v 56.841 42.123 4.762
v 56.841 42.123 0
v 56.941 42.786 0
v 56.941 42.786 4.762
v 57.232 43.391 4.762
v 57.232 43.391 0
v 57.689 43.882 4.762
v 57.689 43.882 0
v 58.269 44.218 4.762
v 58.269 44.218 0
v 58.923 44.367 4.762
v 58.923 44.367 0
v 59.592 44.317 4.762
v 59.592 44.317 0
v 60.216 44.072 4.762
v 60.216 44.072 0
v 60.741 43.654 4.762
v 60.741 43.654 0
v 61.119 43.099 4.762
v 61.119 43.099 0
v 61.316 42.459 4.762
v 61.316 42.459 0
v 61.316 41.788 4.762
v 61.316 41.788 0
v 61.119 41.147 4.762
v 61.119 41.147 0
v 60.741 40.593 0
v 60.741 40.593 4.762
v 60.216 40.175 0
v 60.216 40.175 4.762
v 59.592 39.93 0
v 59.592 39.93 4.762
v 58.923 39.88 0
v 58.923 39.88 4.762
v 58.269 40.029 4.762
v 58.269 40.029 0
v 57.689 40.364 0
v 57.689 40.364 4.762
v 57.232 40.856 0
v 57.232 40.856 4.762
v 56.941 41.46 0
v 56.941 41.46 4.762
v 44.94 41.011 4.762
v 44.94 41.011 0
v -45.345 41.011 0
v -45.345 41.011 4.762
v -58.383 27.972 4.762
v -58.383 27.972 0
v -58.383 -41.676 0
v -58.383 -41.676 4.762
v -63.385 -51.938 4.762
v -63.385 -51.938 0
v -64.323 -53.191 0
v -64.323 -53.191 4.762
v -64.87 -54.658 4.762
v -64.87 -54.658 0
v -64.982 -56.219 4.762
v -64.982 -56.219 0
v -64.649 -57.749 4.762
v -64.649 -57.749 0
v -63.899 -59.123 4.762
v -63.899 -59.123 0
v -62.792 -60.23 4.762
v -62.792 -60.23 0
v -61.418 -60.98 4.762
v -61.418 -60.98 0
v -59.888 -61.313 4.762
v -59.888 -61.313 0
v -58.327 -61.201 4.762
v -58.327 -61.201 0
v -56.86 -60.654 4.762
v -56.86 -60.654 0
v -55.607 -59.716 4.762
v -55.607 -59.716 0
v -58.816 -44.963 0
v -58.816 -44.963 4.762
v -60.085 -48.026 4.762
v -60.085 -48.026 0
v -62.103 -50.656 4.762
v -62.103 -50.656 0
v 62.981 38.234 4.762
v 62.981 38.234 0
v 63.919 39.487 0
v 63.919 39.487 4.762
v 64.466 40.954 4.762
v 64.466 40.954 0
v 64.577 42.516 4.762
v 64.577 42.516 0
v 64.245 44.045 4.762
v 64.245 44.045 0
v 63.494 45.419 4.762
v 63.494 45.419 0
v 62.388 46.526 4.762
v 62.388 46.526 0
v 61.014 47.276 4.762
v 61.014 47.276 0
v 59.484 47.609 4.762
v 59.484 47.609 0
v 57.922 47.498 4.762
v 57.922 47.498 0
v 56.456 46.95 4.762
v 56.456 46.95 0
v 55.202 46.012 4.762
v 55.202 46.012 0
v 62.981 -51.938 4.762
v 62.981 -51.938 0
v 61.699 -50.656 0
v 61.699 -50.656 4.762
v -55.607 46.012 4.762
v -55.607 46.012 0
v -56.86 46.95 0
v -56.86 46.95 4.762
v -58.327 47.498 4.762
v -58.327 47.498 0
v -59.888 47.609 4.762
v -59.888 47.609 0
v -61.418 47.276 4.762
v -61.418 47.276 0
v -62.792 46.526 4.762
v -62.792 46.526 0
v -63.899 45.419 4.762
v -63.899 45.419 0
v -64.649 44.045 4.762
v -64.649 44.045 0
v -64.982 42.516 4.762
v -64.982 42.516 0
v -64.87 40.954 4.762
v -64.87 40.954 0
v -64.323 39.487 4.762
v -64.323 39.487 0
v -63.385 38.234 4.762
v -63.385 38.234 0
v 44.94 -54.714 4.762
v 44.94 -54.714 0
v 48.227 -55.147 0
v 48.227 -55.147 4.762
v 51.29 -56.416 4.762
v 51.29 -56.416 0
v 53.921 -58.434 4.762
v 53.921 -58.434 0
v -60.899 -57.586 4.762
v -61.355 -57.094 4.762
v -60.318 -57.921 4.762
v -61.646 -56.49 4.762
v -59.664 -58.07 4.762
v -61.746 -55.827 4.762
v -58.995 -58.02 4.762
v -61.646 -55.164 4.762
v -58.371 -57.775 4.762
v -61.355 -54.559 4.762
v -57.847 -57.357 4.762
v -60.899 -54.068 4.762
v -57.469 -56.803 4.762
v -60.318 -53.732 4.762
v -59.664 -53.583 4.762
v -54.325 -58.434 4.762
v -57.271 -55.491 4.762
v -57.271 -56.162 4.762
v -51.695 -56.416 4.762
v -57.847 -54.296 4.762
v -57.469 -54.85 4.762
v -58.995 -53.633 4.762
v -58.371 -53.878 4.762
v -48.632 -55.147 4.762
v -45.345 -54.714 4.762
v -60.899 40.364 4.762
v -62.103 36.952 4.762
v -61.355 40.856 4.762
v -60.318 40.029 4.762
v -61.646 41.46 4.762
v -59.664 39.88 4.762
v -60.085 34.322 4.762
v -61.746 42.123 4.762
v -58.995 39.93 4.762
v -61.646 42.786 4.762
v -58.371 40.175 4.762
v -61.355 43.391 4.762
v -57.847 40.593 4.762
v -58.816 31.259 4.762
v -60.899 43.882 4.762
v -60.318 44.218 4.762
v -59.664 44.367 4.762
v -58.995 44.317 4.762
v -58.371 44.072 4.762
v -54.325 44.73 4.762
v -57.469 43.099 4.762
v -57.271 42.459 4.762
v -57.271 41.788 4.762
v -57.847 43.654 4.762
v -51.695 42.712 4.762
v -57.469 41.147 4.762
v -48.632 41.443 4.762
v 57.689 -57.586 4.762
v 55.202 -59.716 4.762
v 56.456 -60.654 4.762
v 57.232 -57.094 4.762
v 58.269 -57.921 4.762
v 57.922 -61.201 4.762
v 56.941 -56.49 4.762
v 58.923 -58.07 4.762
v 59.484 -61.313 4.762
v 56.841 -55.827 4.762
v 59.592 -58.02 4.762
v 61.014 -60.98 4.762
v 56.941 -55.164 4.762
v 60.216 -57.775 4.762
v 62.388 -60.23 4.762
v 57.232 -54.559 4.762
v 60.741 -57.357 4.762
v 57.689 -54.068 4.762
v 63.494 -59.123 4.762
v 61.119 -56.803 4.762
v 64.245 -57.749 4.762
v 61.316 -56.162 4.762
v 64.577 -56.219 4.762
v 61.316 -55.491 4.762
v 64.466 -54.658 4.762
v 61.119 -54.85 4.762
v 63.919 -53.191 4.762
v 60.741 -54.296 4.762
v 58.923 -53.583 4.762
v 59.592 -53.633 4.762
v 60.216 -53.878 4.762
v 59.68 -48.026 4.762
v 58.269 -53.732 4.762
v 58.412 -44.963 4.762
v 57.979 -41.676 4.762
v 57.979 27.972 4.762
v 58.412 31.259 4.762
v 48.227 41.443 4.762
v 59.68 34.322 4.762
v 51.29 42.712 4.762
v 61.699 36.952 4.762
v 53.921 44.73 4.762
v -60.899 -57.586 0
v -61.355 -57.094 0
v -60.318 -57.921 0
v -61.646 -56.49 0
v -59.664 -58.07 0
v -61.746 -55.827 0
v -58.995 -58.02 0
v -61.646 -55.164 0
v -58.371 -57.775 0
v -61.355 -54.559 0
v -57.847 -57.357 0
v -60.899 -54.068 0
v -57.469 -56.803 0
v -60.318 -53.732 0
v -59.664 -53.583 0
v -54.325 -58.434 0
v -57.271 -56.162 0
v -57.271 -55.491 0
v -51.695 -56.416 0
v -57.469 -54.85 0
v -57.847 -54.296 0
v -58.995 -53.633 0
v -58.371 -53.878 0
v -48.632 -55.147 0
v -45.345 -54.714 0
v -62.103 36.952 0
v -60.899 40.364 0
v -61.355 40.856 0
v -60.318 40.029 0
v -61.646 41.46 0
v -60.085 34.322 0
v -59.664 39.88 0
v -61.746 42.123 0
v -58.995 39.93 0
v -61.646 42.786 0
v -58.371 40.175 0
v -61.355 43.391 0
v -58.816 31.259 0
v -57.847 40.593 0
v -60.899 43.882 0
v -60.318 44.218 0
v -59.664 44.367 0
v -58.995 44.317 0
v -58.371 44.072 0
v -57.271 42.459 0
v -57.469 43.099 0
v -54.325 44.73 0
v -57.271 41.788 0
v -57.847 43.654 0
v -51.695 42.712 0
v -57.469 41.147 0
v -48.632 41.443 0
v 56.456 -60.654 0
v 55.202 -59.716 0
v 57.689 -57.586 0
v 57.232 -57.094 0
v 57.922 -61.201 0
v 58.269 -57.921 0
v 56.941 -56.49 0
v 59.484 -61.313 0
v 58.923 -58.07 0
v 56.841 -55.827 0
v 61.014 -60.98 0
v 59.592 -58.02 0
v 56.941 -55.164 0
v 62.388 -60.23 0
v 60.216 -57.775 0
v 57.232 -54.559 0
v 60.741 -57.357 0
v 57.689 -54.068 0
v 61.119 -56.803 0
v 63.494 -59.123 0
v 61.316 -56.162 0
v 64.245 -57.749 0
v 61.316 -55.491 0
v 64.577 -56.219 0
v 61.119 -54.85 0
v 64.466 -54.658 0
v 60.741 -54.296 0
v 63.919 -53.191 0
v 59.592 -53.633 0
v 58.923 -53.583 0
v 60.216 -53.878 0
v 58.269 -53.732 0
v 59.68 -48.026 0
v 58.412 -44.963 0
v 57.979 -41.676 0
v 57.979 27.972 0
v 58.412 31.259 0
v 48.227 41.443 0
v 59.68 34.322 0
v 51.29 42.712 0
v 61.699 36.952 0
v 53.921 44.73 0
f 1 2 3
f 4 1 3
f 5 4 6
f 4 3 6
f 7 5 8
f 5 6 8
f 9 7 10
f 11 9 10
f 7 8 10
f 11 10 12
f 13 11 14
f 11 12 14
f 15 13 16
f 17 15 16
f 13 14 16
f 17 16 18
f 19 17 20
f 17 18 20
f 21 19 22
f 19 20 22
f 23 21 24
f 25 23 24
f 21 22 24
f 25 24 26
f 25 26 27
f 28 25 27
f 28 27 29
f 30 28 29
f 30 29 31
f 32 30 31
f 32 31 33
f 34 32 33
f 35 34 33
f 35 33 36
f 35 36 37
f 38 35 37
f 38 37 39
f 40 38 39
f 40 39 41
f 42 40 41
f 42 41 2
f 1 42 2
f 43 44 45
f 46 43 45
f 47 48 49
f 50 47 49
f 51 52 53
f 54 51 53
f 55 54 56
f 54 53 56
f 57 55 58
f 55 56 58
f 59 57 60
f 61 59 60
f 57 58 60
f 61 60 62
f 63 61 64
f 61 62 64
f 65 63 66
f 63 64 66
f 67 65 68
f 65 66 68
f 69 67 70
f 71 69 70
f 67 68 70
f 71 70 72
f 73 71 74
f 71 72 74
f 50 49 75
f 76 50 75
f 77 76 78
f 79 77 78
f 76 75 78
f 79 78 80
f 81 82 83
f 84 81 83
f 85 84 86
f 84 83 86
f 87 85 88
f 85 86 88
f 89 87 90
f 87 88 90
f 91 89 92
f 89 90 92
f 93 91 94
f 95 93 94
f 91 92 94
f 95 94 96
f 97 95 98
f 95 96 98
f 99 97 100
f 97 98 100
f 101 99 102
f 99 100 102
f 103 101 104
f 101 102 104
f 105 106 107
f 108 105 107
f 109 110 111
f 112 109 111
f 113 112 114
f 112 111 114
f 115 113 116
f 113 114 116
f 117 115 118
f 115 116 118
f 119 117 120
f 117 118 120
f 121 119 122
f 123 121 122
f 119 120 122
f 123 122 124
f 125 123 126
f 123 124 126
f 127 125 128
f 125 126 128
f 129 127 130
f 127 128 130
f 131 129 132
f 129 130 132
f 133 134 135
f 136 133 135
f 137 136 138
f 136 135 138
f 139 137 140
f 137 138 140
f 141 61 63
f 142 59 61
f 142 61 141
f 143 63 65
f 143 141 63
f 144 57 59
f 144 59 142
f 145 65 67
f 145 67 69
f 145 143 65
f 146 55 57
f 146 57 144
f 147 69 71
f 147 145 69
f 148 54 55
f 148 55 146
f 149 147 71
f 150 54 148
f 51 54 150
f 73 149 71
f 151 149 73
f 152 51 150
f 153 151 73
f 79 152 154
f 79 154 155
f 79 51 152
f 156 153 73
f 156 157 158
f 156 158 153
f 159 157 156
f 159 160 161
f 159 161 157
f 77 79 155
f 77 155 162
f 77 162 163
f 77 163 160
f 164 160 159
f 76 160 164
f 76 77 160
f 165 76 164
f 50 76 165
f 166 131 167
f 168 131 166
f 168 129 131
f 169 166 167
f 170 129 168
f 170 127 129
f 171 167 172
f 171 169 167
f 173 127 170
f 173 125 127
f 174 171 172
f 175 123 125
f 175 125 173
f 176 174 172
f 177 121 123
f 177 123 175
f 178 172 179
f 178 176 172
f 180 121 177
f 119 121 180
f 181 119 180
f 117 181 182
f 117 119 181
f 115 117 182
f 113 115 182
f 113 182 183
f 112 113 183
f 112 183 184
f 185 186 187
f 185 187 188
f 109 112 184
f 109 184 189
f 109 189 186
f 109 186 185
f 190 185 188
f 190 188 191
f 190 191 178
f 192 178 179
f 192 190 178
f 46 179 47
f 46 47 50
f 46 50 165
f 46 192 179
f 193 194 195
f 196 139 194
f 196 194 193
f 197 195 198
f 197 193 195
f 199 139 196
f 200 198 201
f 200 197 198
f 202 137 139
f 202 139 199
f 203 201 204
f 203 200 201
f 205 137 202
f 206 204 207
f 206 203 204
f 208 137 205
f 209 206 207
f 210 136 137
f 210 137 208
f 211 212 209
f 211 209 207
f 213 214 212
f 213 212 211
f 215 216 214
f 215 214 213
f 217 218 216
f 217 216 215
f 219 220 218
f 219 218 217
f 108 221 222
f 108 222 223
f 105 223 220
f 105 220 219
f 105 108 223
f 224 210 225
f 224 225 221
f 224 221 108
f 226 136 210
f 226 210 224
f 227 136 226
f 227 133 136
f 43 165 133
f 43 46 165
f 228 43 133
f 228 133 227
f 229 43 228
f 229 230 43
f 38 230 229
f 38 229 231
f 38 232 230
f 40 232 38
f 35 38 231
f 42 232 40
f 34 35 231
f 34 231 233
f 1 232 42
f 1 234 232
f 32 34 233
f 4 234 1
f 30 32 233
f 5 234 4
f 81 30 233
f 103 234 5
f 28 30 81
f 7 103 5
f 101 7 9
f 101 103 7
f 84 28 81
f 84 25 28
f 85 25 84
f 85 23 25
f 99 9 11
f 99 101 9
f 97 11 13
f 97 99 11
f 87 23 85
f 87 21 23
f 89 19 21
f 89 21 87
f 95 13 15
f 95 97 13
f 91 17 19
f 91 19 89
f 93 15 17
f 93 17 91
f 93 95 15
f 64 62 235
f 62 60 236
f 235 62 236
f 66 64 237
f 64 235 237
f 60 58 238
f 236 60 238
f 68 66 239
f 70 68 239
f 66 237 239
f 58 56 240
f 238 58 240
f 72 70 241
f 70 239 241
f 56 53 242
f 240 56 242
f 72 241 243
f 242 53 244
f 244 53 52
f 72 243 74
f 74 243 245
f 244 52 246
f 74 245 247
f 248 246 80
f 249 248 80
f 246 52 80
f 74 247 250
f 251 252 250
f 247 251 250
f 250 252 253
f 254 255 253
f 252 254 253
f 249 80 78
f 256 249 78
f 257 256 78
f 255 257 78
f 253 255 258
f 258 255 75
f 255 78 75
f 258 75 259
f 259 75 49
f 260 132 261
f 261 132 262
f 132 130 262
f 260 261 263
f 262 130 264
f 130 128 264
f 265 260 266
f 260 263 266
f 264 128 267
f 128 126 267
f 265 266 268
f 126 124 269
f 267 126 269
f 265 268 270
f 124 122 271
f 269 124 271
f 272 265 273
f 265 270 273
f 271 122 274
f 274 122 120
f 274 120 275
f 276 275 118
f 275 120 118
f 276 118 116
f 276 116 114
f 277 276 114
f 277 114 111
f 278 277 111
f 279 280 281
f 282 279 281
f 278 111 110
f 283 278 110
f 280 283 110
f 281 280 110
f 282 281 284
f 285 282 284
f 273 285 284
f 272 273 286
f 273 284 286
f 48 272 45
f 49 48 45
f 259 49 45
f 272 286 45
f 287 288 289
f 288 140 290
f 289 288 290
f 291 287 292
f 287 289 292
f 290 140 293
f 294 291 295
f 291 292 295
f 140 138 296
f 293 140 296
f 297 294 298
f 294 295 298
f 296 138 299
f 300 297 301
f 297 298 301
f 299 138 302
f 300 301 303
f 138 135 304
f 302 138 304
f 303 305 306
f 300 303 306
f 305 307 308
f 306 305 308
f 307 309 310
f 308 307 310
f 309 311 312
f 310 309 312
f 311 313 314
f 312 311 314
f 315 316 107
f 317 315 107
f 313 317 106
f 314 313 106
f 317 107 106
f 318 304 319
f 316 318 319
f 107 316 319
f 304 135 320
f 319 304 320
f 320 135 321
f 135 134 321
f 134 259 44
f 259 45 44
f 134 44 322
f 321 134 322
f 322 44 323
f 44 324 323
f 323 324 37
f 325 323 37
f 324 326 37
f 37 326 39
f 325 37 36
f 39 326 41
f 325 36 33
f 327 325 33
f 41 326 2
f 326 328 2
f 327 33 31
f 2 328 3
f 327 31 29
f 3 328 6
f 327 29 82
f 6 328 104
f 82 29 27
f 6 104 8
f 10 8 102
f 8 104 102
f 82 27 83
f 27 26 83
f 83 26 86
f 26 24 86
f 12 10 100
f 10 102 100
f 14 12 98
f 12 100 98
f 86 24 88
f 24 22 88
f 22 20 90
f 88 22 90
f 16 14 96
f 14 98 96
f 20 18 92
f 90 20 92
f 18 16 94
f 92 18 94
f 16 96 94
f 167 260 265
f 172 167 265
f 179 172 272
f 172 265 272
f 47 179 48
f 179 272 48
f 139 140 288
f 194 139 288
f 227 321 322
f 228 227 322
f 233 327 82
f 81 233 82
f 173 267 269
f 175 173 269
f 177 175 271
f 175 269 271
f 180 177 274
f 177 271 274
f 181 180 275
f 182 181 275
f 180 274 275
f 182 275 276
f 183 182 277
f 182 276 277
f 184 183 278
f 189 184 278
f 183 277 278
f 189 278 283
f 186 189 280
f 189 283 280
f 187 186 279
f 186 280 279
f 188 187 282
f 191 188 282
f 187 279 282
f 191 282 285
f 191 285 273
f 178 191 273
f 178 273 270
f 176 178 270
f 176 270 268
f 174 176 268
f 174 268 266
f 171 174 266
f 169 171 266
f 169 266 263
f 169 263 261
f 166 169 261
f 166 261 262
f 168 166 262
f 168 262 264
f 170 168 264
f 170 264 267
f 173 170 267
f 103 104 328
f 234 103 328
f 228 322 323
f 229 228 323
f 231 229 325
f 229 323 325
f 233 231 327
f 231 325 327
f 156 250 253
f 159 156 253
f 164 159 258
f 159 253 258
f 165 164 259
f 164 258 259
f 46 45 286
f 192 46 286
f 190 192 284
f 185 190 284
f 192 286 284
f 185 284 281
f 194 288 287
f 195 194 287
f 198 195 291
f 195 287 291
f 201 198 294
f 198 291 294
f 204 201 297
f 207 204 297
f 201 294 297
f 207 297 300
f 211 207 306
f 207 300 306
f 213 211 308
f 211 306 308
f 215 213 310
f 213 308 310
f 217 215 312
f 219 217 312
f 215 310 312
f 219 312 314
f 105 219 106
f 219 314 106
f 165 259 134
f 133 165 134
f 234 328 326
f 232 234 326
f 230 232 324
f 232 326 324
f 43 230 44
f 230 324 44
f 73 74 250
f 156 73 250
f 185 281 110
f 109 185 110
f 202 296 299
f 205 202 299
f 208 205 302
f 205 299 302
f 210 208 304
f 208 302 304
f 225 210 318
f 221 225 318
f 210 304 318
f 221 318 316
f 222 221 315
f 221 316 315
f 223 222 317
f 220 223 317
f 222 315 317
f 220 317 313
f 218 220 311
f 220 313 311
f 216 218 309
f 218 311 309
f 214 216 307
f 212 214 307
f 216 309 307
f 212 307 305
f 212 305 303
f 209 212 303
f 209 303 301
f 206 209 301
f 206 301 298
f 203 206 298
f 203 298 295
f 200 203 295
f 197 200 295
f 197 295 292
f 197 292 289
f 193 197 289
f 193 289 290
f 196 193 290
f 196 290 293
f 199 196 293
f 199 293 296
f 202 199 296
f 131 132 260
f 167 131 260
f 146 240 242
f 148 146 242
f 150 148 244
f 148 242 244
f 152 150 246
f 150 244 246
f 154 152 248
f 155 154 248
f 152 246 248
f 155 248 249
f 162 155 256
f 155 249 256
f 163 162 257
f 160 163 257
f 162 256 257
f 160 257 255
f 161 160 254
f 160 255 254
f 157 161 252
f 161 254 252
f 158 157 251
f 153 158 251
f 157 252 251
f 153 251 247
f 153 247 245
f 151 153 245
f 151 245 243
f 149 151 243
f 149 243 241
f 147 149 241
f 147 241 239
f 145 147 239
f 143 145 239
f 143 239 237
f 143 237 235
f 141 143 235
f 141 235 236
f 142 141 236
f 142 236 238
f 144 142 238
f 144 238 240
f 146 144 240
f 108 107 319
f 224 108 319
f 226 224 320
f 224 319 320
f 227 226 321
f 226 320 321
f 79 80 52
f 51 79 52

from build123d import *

# Parameters (mm, degrees)
BOSS_EXTRUDE1_DEPTH  = 4.7625
M4_CLEARANCE_HOLE1_D = 4.5


with BuildPart() as part:
    # Sketch2 → Boss-Extrude1 (new body)
    with BuildSketch(Plane.XY):
        with BuildLine():
            Line((-63.385065828, 38.234139131), (-62.103242019, 36.952315321))
            ThreePointArc((-62.103242019, 36.952315321), (-59.350228077, 32.832138791), (-58.38349814, 27.9720592))
            Line((-58.38349814, 27.9720592), (-58.38349814, -41.67556713))
            ThreePointArc((-58.38349814, -41.67556713), (-59.350228077, -46.535646721), (-62.103242019, -50.655823251))
            Line((-62.103242019, -50.655823251), (-63.385065828, -51.93764706))
            ThreePointArc((-63.385065828, -51.93764706), (-63.385065828, -59.715821653), (-55.606891235, -59.715821653))
            Line((-55.606891235, -59.715821653), (-54.325067426, -58.433997844))
            ThreePointArc((-54.325067426, -58.433997844), (-50.204890896, -55.680983902), (-45.344811305, -54.714253965))
            Line((-45.344811305, -54.714253965), (44.940315025, -54.714253965))
            ThreePointArc((44.940315025, -54.714253965), (49.800394616, -55.680983902), (53.920571146, -58.433997844))
            Line((53.920571146, -58.433997844), (55.202394956, -59.715821653))
            ThreePointArc((55.202394956, -59.715821653), (62.980569549, -59.715821653), (62.980569549, -51.93764706))
            Line((62.980569549, -51.93764706), (61.698745739, -50.655823251))
            ThreePointArc((61.698745739, -50.655823251), (58.945731797, -46.535646721), (57.97900186, -41.67556713))
            Line((57.97900186, -41.67556713), (57.97900186, 27.9720592))
            ThreePointArc((57.97900186, 27.9720592), (58.945731797, 32.832138791), (61.698745739, 36.952315321))
            Line((61.698745739, 36.952315321), (62.980569549, 38.234139131))
            ThreePointArc((62.980569549, 38.234139131), (62.980569549, 46.012313724), (55.202394956, 46.012313724))
            Line((55.202394956, 46.012313724), (53.920571146, 44.730489914))
            ThreePointArc((53.920571146, 44.730489914), (49.800394616, 41.977475972), (44.940315025, 41.010746035))
            Line((44.940315025, 41.010746035), (-45.344811305, 41.010746035))
            ThreePointArc((-45.344811305, 41.010746035), (-50.204890896, 41.977475972), (-54.325067426, 44.730489914))
            Line((-54.325067426, 44.730489914), (-55.606891235, 46.012313724))
            ThreePointArc((-55.606891235, 46.012313724), (-63.385065828, 46.012313724), (-63.385065828, 38.234139131))
        make_face()
    extrude(amount=BOSS_EXTRUDE1_DEPTH)

    # M4 Clearance Hole1 (through all)
    with Locations(Plane.XY.offset(4.7625)):
        with Locations((-59.495978532, -55.826734357), (-59.495978532, 42.123226427), (59.091482252, 42.123226427), (59.091482252, -55.826734357)):
            Hole(M4_CLEARANCE_HOLE1_D / 2)


solid = part.part
